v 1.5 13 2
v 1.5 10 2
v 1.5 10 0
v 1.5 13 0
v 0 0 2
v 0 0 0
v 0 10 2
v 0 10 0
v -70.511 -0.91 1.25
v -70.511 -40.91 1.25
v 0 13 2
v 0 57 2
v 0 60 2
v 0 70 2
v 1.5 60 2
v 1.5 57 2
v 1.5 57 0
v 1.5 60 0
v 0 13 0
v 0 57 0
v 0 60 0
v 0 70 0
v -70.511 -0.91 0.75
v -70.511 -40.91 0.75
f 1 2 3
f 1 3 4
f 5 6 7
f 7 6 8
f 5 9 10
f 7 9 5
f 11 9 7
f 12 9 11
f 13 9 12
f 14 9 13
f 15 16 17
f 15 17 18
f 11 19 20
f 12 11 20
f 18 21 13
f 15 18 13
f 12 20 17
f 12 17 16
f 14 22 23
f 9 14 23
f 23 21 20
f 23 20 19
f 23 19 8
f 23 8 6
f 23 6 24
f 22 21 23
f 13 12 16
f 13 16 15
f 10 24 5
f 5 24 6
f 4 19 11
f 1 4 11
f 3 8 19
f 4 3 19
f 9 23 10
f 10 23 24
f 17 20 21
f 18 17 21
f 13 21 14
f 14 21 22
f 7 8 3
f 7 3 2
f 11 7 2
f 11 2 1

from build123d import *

# Parameters (mm, degrees)
F1_DEPTH = 2
F4_DEPTH = 130.110583
F5_W     = 3
F5_H     = 2
F6_DEPTH = 1.5


with BuildPart() as f1:
    # F0 (on Top) → F1 (new body)
    with BuildSketch(Plane.XY):
        Polygon((-70.511212, -40.909583), (0, 0), (0, 70), (-70.511212, -0.909583), align=None)
    extrude(amount=F1_DEPTH)

    # F3 (on offset) → F4 (cut, through all)
    with BuildSketch(Plane.XZ.offset(-89.2)):
        Polygon((-70.511212, 0), (0, 0), (-70.511212, 0.75), align=None)
        Polygon((-70.511212, 1.25), (0, 2), (-70.511212, 2), align=None)
    extrude(amount=F4_DEPTH, mode=Mode.SUBTRACT)

    # F5 (on face) → F6 (join)
    with BuildSketch(Plane.YZ):
        with Locations((58.5, 1)):
            Rectangle(F5_W, F5_H)
        with Locations((11.5, 1)):
            Rectangle(F5_W, F5_H)
    extrude(amount=F6_DEPTH)


solid = f1.part
